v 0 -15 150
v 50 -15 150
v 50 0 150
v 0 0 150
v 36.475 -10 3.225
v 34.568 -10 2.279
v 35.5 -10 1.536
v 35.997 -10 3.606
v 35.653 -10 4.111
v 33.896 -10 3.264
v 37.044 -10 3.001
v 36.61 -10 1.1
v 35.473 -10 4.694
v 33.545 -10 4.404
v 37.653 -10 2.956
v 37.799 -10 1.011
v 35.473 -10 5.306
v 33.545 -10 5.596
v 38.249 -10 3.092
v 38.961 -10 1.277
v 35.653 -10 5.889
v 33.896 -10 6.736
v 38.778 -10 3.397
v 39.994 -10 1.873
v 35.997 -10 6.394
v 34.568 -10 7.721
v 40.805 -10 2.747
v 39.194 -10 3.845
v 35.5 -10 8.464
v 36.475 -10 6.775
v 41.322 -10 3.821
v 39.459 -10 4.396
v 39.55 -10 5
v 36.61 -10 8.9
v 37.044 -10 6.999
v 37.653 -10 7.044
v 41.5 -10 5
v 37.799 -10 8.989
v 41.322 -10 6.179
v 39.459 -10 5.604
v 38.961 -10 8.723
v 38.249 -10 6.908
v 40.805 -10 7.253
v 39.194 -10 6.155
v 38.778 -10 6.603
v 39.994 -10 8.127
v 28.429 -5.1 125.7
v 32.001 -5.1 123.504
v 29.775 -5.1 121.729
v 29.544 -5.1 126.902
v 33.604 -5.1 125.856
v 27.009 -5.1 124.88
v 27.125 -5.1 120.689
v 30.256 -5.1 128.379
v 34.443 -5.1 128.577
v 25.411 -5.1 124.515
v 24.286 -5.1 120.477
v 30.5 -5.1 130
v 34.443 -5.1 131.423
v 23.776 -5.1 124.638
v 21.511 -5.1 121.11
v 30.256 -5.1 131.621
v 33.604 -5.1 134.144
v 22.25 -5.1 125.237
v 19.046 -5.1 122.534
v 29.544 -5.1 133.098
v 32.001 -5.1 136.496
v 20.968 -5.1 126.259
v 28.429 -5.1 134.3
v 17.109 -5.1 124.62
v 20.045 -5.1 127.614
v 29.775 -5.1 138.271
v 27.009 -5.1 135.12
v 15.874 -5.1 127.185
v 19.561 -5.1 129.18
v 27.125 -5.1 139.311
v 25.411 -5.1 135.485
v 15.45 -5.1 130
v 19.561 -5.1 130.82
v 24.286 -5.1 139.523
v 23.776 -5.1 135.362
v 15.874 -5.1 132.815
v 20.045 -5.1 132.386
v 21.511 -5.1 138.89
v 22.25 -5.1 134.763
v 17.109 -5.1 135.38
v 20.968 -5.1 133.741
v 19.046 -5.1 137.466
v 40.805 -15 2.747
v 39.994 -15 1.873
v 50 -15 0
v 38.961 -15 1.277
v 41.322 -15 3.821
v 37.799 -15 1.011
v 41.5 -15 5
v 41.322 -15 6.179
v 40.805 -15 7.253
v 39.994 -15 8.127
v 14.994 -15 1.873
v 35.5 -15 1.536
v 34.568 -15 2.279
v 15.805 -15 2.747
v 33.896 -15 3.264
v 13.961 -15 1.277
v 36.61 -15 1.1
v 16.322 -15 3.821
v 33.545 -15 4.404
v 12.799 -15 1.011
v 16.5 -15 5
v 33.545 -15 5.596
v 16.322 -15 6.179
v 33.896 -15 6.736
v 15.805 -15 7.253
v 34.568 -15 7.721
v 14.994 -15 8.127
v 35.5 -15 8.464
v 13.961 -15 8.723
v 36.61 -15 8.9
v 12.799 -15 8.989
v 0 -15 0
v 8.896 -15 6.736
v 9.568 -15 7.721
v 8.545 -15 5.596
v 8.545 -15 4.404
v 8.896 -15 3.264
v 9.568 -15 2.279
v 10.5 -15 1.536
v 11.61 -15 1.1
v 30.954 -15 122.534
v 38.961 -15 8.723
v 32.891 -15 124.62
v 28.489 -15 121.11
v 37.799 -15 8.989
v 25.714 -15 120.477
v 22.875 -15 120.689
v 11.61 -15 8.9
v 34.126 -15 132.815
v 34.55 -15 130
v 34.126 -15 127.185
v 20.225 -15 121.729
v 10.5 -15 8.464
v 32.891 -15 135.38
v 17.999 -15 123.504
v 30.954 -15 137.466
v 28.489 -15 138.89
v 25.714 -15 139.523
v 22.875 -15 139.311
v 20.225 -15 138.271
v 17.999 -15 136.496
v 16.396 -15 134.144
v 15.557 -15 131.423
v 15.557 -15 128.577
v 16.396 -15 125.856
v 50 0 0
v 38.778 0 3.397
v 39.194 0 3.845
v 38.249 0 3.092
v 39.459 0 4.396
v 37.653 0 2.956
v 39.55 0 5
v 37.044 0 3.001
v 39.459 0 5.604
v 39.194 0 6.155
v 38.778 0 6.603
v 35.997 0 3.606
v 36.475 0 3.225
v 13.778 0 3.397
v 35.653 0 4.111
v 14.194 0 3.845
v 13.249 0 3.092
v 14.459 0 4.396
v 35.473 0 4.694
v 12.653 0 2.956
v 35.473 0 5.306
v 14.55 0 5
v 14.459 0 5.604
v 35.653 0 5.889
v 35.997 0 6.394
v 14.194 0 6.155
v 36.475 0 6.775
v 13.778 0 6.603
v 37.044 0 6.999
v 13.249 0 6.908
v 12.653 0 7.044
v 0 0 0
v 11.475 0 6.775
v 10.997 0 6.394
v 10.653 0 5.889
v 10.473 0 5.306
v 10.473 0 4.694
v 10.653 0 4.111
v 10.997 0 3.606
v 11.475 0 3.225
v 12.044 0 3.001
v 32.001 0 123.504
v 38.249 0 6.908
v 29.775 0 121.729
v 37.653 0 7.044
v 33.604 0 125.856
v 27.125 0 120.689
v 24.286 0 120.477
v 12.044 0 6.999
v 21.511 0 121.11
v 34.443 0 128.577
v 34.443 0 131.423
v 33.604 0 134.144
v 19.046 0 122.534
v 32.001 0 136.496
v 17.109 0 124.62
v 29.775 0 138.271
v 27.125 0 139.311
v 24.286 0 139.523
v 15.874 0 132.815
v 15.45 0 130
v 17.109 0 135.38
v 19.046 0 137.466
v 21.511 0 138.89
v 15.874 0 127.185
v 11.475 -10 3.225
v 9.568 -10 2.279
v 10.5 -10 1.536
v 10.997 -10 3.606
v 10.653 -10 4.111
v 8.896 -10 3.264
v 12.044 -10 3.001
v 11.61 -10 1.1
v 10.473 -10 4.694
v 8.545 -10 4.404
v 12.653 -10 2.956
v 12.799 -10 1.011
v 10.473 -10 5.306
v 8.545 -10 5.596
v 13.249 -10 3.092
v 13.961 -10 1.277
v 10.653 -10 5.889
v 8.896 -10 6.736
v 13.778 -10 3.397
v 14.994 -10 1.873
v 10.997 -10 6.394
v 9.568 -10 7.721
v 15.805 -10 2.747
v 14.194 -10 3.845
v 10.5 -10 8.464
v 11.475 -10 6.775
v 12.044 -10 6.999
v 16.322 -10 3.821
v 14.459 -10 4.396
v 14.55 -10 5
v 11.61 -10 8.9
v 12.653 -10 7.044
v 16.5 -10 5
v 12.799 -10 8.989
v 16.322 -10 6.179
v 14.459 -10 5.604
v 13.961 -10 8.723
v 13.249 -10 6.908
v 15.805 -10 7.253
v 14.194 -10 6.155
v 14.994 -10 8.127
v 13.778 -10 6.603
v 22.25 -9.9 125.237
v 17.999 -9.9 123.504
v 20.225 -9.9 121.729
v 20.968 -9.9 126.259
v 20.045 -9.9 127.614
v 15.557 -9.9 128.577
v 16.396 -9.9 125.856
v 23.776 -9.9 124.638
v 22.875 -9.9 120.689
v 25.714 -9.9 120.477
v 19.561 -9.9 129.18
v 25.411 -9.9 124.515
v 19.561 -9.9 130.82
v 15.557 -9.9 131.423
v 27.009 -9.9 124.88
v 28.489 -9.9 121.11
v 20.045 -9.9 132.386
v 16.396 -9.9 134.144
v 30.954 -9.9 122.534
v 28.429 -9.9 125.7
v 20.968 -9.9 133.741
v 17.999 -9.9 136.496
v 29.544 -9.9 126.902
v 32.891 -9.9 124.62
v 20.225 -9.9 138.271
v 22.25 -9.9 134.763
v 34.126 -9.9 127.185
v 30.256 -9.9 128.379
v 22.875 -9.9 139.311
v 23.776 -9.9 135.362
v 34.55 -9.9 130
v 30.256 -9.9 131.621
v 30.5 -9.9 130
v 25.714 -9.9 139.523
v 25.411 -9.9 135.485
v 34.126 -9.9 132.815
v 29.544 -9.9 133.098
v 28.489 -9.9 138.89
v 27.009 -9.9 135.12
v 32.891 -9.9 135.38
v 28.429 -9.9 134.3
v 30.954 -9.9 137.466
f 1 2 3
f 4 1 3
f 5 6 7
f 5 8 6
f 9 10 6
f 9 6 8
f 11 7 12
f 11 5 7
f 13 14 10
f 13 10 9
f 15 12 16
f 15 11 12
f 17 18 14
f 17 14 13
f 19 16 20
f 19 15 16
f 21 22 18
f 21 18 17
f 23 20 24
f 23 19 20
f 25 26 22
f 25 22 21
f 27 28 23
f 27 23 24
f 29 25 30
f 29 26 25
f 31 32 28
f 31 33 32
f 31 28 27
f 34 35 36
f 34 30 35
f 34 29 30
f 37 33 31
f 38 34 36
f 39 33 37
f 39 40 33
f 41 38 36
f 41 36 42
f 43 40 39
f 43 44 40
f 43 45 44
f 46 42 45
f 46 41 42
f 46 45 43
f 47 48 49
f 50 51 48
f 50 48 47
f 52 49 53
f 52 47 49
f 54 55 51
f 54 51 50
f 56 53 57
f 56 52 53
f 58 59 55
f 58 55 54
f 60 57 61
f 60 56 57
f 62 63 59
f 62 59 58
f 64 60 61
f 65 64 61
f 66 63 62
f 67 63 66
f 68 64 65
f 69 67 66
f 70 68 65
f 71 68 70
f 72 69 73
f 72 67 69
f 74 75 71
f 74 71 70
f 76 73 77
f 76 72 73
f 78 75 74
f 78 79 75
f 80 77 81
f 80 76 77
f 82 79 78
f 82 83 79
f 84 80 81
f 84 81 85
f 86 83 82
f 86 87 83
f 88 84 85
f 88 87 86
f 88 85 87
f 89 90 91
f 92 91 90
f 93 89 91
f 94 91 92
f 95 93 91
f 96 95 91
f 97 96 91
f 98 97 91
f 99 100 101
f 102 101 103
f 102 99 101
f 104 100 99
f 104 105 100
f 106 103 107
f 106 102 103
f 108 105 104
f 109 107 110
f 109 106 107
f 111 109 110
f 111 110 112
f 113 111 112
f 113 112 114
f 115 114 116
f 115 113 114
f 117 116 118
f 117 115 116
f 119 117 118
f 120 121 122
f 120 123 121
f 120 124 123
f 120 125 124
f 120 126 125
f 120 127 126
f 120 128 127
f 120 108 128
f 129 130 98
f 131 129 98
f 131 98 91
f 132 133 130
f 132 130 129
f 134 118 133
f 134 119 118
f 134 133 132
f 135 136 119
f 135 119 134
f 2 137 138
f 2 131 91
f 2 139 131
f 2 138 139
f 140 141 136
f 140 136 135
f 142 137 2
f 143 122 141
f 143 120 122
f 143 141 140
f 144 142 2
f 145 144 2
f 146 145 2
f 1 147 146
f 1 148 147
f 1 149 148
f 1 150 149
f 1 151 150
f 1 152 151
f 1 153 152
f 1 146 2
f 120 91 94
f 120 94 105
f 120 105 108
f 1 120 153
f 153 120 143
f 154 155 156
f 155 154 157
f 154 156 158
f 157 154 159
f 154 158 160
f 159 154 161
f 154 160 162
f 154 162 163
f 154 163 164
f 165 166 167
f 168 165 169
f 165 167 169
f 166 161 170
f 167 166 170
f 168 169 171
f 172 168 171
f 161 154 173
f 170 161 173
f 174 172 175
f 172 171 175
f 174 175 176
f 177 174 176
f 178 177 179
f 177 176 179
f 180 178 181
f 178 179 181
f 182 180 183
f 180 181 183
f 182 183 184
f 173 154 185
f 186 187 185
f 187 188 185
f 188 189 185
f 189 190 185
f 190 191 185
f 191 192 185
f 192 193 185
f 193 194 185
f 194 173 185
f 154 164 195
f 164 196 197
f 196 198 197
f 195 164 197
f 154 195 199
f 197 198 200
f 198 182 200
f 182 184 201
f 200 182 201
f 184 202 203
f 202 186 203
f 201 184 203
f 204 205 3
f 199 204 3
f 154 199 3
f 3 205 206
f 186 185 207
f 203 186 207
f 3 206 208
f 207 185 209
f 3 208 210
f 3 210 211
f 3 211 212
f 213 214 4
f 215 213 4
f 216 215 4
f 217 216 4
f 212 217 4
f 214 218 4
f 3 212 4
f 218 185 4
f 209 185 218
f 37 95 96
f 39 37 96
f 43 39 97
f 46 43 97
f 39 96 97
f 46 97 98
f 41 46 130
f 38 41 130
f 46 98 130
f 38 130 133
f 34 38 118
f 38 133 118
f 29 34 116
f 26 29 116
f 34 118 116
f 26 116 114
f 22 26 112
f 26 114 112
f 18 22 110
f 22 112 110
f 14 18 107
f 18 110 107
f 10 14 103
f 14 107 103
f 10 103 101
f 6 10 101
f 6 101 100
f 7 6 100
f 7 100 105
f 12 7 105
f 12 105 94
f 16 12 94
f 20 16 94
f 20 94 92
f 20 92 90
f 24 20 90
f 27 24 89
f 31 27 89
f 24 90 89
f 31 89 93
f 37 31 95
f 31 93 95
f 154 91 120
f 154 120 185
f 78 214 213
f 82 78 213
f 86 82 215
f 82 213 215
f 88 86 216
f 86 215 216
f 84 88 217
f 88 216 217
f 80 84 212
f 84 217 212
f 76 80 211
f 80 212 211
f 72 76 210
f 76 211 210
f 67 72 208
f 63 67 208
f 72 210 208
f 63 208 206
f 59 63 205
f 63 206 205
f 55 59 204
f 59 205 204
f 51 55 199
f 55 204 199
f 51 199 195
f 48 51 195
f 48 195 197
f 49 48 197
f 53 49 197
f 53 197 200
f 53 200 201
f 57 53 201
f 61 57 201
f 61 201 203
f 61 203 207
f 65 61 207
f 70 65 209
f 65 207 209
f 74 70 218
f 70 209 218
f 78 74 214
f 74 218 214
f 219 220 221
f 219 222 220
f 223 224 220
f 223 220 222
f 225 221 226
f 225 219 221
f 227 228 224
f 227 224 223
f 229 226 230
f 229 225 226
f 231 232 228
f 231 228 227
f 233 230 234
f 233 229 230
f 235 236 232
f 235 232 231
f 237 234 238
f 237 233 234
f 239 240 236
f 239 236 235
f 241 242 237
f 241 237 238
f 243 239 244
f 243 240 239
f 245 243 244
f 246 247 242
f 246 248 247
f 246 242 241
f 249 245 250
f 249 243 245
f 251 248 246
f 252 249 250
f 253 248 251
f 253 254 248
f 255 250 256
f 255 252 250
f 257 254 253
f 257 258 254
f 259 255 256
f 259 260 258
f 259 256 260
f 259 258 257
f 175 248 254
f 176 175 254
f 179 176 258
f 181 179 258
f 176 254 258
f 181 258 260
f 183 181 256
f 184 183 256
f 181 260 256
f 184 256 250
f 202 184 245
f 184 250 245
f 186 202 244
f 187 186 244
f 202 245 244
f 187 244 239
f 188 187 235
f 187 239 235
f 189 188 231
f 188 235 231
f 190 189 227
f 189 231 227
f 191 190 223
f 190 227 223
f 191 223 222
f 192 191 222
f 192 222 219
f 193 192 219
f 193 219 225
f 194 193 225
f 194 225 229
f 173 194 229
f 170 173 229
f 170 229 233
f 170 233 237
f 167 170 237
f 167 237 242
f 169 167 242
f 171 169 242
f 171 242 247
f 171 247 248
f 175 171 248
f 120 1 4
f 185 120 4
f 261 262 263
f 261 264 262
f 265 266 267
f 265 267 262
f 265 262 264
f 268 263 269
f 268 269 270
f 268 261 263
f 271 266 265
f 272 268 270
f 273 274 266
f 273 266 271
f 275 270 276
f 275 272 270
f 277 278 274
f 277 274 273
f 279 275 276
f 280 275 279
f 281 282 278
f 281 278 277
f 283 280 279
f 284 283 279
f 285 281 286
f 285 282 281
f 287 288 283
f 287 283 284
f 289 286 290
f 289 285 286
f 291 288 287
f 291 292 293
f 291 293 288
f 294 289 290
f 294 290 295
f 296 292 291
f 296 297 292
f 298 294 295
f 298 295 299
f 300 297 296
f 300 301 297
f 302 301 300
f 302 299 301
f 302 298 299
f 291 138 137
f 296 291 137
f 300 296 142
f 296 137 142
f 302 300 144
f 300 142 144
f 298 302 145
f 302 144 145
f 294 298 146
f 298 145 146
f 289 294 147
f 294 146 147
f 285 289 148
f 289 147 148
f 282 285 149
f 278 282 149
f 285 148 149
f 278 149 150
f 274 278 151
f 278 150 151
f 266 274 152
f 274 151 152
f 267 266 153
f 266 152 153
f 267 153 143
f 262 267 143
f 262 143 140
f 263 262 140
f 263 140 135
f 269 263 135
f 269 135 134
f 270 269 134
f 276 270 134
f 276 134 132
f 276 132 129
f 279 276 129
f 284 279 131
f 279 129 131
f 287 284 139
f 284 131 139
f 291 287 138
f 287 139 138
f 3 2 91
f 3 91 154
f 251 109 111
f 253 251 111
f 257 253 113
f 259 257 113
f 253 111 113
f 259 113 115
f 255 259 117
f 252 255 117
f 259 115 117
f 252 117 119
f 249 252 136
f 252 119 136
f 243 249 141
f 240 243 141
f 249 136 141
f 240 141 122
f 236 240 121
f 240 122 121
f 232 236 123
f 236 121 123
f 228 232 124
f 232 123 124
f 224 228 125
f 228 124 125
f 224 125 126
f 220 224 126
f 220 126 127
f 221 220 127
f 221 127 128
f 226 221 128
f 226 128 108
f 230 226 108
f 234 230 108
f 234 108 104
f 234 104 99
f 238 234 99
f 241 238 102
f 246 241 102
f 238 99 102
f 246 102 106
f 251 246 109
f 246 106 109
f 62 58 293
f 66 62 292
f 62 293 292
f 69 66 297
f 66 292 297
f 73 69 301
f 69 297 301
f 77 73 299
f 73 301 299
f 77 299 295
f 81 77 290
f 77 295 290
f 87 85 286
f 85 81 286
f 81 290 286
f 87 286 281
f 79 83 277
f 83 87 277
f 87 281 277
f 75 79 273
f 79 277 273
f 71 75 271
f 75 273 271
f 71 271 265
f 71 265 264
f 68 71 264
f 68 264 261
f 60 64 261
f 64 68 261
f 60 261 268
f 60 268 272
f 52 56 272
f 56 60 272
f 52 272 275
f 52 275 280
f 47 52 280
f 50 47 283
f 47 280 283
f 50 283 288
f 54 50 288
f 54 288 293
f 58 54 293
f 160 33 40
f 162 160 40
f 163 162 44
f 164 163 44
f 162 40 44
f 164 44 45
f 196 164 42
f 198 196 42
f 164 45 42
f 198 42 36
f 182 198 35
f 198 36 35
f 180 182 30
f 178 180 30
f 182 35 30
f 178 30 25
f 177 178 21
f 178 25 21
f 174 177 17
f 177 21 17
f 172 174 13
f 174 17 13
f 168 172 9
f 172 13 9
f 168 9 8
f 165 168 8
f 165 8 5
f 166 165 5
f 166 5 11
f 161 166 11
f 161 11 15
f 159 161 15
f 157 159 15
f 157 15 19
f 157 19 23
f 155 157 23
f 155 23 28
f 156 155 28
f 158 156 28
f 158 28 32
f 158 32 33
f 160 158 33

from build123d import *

# Parameters (mm, degrees)
F0_W     = 15
F0_H     = 150
F1_DEPTH = 50
F2_R     = 5.5
F2_R_2   = 2.05
F3_DEPTH = 15
F2_R_3   = 4
F4_DEPTH = 5
F2_R_4   = 9.55
F5_DEPTH = 5.1
F6_R     = 9.55
F6_R_2   = 5.5
F7_DEPTH = 5.1


with BuildPart() as f1:
    # F0 (on Right) → F1 (new body)
    with BuildSketch(Plane.YZ):
        with Locations((-7.5, 75)):
            Rectangle(F0_W, F0_H)
    extrude(amount=F1_DEPTH)

    # F2 (on face) → F3 (cut, through all)
    with BuildSketch(Plane.XZ.offset(15)):
        with Locations((25, 130)):
            Circle(F2_R)
        with Locations((12.5, 5)):
            Circle(F2_R_2)
        with Locations((37.5, 5)):
            Circle(F2_R_2)
    extrude(amount=-F3_DEPTH, mode=Mode.SUBTRACT)

    # F2 (on face) → F4 (cut)
    with BuildSketch(Plane.XZ.offset(15)):
        with Locations((12.5, 5)):
            Circle(F2_R_3)
        with Locations((12.5, 5)):
            Circle(F2_R_2, mode=Mode.SUBTRACT)
        with Locations((37.5, 5)):
            Circle(F2_R_3)
        with Locations((37.5, 5)):
            Circle(F2_R_2, mode=Mode.SUBTRACT)
    extrude(amount=-F4_DEPTH, mode=Mode.SUBTRACT)

    # F2 (on face) → F5 (cut)
    with BuildSketch(Plane.XZ.offset(15)):
        with Locations((25, 130)):
            Circle(F2_R_4)
        with Locations((25, 130)):
            Circle(F2_R, mode=Mode.SUBTRACT)
    extrude(amount=-F5_DEPTH, mode=Mode.SUBTRACT)

    # F6 (on face) → F7 (cut)
    with BuildSketch(Plane(origin=(0, 0, 0), x_dir=(-1, 0, 0), z_dir=(0, 1, 0))):
        with Locations((-25, 130)):
            Circle(F6_R)
        with Locations((-25, 130)):
            Circle(F6_R_2, mode=Mode.SUBTRACT)
    extrude(amount=-F7_DEPTH, mode=Mode.SUBTRACT)


solid = f1.part
